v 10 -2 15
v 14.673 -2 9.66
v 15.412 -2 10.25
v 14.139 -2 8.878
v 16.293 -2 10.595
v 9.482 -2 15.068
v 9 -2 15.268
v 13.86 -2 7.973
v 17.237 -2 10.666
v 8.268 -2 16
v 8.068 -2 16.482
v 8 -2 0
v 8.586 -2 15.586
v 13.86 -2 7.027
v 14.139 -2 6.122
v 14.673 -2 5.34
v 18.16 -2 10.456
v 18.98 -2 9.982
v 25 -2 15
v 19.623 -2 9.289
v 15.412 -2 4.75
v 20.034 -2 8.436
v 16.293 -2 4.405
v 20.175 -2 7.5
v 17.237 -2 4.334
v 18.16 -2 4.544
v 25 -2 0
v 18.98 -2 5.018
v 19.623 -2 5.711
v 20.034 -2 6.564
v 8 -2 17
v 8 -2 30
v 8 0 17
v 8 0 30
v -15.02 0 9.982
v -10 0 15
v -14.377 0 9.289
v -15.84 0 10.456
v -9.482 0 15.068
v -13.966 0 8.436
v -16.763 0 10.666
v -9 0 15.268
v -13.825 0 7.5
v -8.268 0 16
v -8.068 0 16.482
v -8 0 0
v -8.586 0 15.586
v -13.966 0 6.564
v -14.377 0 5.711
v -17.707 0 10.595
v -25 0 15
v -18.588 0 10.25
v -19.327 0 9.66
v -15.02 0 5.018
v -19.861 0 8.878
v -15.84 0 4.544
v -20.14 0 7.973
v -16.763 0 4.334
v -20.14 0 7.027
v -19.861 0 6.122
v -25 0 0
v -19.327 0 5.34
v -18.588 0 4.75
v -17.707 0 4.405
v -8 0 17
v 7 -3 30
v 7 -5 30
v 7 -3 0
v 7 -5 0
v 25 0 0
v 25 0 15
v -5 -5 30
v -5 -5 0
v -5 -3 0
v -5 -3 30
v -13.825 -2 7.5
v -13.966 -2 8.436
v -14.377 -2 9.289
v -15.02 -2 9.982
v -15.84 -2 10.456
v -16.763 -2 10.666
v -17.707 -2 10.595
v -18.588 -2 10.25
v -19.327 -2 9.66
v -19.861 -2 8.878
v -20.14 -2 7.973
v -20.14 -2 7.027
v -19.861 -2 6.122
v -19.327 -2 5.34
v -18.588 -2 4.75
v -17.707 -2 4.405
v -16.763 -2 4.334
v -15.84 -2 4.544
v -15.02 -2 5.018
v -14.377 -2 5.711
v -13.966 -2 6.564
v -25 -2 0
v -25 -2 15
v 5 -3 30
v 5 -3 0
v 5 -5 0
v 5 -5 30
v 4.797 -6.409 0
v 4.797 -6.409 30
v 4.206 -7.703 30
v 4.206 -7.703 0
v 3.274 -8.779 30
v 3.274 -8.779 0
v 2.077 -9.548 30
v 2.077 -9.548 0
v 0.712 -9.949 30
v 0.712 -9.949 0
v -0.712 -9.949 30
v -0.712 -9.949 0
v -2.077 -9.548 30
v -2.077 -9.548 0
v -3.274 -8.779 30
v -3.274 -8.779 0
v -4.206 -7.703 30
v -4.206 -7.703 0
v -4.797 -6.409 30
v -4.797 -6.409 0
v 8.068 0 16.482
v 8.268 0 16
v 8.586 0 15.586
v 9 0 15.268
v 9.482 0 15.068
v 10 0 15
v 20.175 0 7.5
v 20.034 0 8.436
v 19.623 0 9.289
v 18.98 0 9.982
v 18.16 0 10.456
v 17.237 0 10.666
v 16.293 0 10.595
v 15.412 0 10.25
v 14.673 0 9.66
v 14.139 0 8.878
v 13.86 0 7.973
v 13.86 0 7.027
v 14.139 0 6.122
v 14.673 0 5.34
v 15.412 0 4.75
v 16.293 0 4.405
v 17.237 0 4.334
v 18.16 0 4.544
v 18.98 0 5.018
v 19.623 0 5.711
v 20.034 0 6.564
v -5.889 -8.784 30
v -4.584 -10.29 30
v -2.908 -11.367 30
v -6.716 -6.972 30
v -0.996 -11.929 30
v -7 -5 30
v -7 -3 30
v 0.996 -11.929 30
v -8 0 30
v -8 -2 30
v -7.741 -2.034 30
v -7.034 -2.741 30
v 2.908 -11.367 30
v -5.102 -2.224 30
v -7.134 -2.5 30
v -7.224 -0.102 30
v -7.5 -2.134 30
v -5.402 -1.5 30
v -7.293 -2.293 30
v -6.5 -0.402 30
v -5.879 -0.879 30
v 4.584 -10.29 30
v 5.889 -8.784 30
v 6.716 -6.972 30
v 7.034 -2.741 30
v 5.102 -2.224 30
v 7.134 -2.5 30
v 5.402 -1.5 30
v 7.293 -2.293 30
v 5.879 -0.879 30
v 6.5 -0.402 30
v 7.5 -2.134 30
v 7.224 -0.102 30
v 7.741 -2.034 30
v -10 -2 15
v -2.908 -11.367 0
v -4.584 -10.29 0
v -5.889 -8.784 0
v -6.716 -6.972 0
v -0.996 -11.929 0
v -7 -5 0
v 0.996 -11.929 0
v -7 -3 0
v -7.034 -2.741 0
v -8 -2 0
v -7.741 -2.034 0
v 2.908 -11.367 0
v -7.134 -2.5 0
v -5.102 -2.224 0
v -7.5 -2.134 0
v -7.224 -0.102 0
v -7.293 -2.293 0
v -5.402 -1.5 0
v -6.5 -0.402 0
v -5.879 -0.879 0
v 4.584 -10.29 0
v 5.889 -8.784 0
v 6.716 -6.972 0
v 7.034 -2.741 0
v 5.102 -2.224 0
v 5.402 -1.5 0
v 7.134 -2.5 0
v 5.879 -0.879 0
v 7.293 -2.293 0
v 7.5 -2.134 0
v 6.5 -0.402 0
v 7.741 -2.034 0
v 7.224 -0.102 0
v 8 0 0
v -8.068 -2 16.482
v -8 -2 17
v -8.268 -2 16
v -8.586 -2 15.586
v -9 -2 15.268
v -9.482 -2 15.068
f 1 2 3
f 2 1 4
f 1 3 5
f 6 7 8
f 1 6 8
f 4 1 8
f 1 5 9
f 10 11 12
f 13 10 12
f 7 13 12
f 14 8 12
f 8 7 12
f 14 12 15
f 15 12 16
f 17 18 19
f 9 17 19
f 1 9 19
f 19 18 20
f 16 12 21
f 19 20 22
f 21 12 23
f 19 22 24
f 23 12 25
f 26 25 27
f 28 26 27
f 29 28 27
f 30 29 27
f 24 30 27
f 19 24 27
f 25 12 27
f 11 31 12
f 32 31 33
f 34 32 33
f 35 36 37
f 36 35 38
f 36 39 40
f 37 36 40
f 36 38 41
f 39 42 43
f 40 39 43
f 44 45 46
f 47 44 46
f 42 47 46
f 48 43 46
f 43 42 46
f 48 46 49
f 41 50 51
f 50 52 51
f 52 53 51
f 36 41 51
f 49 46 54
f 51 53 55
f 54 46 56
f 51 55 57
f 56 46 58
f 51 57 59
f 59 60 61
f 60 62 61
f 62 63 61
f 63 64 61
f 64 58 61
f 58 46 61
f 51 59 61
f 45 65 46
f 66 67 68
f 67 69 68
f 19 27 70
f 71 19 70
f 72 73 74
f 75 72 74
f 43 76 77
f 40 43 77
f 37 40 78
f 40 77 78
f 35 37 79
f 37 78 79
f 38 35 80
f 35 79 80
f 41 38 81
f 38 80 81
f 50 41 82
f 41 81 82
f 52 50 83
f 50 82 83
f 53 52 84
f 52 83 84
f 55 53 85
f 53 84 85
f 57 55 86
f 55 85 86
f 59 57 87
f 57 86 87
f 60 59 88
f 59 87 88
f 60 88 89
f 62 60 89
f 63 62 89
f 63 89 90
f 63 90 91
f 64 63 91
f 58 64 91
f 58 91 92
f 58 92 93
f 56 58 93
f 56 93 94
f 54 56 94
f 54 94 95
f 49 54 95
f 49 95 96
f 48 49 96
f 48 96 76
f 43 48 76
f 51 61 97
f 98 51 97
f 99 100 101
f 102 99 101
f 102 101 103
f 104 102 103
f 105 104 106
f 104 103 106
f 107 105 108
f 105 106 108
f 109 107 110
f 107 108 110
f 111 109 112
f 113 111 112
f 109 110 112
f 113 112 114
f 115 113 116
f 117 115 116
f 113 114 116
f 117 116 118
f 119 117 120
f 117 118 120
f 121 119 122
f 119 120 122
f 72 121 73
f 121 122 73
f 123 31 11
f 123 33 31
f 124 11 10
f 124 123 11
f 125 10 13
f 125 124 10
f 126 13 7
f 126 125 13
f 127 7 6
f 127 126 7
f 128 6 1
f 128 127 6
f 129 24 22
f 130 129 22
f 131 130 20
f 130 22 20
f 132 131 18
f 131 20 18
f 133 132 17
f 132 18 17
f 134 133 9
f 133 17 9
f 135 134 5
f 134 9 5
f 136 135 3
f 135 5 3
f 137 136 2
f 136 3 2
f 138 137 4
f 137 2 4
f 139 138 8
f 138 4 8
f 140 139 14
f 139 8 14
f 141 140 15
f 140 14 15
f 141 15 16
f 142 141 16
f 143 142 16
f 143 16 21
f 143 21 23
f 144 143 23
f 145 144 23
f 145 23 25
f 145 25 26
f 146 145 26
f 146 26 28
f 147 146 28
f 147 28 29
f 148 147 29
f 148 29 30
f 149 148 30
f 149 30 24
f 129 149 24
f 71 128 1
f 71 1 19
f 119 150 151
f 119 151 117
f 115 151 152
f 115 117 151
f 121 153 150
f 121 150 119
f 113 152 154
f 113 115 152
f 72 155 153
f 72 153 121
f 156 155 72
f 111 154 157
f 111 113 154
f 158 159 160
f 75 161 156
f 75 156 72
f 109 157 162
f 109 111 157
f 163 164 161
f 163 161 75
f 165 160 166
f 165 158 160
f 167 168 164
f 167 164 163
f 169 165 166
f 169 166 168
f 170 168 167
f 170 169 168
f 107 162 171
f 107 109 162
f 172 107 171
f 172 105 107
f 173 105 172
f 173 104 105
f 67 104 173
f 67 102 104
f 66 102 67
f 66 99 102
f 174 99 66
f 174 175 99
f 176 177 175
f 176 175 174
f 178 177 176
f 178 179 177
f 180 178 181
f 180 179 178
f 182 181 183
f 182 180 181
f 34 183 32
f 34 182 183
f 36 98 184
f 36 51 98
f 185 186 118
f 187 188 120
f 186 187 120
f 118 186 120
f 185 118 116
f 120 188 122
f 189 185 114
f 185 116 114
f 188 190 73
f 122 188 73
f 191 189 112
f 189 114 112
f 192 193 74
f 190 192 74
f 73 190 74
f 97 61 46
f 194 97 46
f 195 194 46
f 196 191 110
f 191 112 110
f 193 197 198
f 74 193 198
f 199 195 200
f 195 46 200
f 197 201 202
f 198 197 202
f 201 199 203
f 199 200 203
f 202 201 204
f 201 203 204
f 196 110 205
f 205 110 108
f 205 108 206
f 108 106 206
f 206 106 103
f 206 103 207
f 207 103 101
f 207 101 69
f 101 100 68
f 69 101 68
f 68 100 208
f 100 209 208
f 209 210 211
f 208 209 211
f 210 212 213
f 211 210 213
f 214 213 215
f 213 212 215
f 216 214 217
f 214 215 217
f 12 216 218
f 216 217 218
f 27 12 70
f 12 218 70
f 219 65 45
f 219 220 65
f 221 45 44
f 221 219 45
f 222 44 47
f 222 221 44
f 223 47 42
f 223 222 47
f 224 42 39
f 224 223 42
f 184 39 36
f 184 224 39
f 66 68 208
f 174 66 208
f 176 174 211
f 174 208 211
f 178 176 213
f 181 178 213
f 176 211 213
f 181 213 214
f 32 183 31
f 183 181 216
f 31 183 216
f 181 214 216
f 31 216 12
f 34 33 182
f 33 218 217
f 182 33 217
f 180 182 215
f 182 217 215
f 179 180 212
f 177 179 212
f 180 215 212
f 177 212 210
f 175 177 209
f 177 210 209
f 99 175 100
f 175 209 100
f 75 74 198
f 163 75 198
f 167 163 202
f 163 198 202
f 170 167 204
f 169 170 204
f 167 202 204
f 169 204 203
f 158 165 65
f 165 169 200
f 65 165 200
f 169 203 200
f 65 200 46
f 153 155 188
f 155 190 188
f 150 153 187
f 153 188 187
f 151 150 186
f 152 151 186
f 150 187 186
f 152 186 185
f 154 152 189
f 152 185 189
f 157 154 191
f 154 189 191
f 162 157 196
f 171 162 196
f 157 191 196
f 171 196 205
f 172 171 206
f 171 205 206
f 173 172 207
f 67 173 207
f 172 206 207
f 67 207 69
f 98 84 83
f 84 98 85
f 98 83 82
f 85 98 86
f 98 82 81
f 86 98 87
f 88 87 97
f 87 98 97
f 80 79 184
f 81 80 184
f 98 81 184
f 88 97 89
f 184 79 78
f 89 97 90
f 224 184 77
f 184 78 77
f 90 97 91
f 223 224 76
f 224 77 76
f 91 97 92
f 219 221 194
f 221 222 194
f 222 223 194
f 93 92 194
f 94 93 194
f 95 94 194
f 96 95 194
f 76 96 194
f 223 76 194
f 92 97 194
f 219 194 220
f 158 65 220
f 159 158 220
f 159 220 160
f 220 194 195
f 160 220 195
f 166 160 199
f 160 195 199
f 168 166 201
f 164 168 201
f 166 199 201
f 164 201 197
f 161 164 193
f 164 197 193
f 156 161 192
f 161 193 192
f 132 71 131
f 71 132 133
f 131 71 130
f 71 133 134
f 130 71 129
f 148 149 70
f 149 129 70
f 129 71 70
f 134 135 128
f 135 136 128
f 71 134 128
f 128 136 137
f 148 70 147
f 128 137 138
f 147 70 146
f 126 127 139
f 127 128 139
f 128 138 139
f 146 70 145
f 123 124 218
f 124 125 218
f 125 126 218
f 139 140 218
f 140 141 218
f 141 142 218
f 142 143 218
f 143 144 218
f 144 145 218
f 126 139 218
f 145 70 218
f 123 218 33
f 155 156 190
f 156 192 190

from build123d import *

# Parameters (mm, degrees)
F1_DEPTH = 15
F3_DEPTH = 15
F4_R     = 2
F6_D     = 6.35


with BuildPart() as f1:
    # F0 (on Top) → F1 (new body)
    with BuildSketch(Plane.XY):
        with BuildLine():
            Line((-8, 0), (-25, 0))
            Line((-25, 0), (-25, -2))
            Line((-25, -2), (-8, -2))
            ThreePointArc((-8, -2), (-7.292893, -2.292893), (-7, -3))
            Line((-7, -3), (-7, -5))
            ThreePointArc((-7, -5), (0, -12), (7, -5))
            Line((7, -5), (7, -3))
            ThreePointArc((7, -3), (7.292893, -2.292893), (8, -2))
            Line((8, -2), (25, -2))
            Line((25, -2), (25, 0))
            Line((25, 0), (8, 0))
            ThreePointArc((8, 0), (5.87868, -0.87868), (5, -3))
            Line((5, -3), (5, -5))
            ThreePointArc((5, -5), (0, -10), (-5, -5))
            Line((-5, -5), (-5, -3))
            ThreePointArc((-5, -3), (-5.87868, -0.87868), (-8, 0))
        make_face()
    extrude(amount=F1_DEPTH)

    # F2 (on face) → F3 (join)
    with BuildSketch(Plane.XY.offset(15)):
        with BuildLine():
            Line((-5, -5), (-5, -3))
            ThreePointArc((-5, -3), (-5.87868, -0.87868), (-8, 0))
            Line((-8, 0), (-8, -2))
            ThreePointArc((-8, -2), (-7.292893, -2.292893), (-7, -3))
            Line((-7, -3), (-7, -5))
            ThreePointArc((-7, -5), (0, -12), (7, -5))
            Line((7, -5), (7, -3))
            ThreePointArc((7, -3), (7.292893, -2.292893), (8, -2))
            Line((8, -2), (8, 0))
            ThreePointArc((8, 0), (5.87868, -0.87868), (5, -3))
            Line((5, -3), (5, -5))
            ThreePointArc((5, -5), (0, -10), (-5, -5))
        make_face()
    extrude(amount=F3_DEPTH)

    # F4
    f4_edges = [f1.edges().sort_by_distance(p)[0] for p in [
        (-8, -1, 15),
        (8, -1, 15),
    ]]
    fillet(f4_edges, radius=F4_R)

    # F6 (through all)
    with Locations(Plane(origin=(0, 0, 0), x_dir=(-1, 0, 0), z_dir=(0, 1, 0))):
        with Locations((-17, 7.5), (17, 7.5)):
            Hole(F6_D / 2)


solid = f1.part
